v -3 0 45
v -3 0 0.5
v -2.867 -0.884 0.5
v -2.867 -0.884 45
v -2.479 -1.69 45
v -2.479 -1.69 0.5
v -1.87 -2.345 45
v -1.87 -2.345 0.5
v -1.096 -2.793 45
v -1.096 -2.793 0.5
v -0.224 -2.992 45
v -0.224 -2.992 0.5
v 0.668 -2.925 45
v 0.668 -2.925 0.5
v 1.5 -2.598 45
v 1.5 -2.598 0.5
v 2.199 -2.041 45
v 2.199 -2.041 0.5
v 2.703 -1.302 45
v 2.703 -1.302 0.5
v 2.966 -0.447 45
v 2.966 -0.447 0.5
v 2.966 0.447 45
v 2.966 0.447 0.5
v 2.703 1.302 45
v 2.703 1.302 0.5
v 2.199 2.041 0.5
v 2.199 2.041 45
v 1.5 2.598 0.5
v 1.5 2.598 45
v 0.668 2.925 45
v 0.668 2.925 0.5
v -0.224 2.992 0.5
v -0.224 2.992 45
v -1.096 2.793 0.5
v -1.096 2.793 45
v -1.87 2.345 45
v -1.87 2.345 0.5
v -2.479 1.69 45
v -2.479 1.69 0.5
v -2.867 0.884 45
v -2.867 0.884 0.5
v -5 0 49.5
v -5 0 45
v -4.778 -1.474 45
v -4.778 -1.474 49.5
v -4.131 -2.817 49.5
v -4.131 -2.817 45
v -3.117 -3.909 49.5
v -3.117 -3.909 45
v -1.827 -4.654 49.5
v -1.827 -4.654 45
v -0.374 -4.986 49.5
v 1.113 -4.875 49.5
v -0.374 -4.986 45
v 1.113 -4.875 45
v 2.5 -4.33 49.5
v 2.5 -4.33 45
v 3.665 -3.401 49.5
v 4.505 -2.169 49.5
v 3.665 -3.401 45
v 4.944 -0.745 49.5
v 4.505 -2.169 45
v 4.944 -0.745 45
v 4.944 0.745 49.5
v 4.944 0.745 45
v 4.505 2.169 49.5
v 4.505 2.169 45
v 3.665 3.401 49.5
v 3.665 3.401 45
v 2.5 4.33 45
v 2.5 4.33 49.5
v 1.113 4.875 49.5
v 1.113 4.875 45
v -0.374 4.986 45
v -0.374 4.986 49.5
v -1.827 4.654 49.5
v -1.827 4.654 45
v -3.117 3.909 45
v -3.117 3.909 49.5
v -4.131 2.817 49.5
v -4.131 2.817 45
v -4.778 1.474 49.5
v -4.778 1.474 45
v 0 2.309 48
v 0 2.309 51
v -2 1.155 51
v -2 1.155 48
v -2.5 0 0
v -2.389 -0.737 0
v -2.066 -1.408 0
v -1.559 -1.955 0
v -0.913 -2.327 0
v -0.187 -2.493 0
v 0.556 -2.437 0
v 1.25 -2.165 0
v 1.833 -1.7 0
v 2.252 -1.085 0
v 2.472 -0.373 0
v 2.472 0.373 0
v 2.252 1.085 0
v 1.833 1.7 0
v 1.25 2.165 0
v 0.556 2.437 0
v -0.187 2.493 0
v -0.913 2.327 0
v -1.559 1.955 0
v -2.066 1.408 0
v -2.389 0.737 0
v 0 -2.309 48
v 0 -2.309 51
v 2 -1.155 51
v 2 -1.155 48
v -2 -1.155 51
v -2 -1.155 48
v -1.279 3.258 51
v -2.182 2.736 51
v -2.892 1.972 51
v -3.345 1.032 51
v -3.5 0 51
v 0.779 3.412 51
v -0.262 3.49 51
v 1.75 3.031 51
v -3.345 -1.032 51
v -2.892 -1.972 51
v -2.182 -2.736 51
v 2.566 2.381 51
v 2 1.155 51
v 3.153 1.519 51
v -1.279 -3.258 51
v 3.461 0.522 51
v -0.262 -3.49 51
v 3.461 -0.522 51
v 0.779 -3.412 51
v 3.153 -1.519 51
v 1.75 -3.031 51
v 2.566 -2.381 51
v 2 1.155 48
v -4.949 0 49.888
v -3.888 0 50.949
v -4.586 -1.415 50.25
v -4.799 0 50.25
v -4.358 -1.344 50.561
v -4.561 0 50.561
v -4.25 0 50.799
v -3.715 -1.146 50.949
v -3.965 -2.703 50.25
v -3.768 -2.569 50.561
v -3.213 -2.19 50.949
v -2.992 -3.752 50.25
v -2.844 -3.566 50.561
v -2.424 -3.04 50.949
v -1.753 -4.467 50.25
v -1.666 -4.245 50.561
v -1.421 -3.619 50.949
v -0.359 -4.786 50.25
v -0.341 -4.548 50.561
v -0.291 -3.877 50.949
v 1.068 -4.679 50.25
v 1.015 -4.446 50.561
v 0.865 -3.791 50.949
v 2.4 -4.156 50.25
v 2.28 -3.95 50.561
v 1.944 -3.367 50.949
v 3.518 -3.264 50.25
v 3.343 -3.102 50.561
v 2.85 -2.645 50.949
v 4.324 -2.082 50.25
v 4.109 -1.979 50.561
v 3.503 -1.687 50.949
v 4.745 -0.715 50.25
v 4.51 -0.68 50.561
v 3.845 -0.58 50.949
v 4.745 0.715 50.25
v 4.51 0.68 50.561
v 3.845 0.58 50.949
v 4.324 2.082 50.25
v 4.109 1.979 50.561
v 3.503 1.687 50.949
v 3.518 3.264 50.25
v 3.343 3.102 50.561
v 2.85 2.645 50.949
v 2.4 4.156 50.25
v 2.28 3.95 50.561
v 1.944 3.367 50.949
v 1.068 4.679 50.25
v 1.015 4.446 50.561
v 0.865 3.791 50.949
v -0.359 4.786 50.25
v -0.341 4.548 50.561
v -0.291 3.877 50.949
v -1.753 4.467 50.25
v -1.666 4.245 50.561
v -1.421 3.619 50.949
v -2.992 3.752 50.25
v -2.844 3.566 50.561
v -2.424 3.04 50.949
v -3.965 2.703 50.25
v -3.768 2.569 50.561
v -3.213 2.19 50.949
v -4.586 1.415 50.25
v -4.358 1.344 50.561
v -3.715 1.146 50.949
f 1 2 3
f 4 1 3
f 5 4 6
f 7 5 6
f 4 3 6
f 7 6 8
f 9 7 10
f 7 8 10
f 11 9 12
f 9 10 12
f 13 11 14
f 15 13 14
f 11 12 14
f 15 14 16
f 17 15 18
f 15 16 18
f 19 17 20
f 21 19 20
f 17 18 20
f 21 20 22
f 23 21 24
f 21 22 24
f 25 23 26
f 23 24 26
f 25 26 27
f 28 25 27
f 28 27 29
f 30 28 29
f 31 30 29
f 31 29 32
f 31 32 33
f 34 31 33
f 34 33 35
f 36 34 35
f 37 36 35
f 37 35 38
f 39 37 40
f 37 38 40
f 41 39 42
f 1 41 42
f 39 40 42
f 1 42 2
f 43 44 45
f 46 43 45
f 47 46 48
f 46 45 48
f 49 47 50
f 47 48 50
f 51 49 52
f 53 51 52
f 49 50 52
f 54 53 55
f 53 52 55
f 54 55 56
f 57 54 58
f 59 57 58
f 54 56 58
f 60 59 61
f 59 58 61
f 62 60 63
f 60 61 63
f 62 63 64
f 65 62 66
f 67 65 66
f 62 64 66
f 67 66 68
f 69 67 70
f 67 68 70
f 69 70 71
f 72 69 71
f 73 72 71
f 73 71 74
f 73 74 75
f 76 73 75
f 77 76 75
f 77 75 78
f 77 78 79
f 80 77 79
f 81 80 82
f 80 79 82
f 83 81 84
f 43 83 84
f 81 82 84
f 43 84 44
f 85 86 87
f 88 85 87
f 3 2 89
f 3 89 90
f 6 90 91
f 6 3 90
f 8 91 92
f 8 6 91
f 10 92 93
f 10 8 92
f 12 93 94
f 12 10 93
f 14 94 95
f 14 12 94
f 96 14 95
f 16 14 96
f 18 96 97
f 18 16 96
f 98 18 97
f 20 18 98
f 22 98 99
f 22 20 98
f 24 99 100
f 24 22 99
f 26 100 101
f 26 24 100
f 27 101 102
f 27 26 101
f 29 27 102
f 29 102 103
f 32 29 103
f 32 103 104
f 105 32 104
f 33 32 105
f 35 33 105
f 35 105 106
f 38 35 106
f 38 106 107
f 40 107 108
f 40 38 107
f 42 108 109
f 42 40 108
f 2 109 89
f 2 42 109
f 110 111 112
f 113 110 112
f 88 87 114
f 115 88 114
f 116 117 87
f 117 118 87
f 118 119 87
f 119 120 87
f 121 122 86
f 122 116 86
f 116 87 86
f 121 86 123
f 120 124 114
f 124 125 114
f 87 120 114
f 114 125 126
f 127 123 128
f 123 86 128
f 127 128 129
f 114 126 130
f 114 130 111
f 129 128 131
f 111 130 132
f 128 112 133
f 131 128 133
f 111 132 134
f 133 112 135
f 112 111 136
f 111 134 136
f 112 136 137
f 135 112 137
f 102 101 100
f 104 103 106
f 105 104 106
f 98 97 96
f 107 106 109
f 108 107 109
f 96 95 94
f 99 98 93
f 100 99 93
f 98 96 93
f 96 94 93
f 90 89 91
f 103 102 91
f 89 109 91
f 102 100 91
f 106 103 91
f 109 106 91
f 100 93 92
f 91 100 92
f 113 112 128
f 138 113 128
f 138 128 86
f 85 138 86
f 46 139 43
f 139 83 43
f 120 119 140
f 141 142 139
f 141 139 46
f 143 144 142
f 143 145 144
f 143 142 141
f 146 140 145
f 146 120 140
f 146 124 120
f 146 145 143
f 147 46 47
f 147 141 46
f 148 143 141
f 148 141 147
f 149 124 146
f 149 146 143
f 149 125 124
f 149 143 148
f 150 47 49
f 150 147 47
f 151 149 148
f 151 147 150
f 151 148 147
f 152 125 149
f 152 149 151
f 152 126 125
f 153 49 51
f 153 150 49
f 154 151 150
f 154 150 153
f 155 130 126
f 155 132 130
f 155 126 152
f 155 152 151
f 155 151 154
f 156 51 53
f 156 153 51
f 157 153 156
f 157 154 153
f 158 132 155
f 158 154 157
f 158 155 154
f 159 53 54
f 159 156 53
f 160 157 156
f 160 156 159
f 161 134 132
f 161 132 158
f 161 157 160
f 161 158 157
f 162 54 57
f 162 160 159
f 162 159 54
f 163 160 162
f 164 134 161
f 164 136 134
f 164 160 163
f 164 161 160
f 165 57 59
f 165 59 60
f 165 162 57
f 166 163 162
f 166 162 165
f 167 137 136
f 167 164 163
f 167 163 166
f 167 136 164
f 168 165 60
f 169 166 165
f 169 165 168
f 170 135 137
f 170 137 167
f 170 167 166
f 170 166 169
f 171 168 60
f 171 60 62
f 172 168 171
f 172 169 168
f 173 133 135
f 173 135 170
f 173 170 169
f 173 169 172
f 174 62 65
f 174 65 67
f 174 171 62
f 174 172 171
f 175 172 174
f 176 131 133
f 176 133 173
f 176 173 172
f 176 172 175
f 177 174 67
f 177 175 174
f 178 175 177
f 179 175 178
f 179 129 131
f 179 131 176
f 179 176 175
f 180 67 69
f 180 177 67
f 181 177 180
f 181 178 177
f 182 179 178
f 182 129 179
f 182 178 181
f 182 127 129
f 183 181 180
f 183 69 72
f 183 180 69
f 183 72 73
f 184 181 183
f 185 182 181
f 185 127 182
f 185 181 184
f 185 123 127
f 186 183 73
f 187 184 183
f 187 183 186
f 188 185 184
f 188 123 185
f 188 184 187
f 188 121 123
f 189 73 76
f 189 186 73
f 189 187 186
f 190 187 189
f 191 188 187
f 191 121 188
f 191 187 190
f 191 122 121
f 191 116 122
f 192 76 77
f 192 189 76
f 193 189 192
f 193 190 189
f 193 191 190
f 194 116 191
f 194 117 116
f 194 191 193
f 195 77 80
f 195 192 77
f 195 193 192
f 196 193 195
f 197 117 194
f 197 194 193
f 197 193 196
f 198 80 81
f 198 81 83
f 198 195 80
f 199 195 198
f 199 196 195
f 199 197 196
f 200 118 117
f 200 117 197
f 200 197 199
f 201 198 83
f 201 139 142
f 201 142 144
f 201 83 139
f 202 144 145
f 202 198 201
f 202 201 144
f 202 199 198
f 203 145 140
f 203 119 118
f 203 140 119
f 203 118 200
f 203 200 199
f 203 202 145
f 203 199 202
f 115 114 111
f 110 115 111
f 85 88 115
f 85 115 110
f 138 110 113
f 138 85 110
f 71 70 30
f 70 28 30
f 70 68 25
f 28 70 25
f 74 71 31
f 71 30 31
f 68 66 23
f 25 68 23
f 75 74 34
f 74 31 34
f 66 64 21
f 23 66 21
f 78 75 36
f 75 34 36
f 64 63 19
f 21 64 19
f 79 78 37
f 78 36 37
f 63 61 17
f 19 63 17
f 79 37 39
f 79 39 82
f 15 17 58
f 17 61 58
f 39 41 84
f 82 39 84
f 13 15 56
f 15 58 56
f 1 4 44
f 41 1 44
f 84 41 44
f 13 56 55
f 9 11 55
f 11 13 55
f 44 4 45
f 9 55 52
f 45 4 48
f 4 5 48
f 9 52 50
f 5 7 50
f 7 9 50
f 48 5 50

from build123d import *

# Parameters (mm, degrees)
F2_SIZE  = 0.5
F3_R     = 1.5
F5_DEPTH = 3


with BuildPart() as f1:
    # F0 (on Front) → F1 (revolve)
    with BuildSketch(Plane.XZ):
        Polygon((-3, 0), (0, 0), (0, 51), (-5, 51), (-5, 45), (-3, 45), align=None)
    revolve(axis=Axis((0, 0, 29.048277), (0, 0, 1)))

    # F2
    f2_edges = [f1.edges().sort_by_distance(p)[0] for p in [
        (3, 0, 0),
    ]]
    chamfer(f2_edges, length=F2_SIZE)

    # F3
    f3_edges = [f1.edges().sort_by_distance(p)[0] for p in [
        (5, 0, 51),
    ]]
    fillet(f3_edges, radius=F3_R)

    # F4 (on face) → F5 (cut)
    with BuildSketch(Plane.XY.offset(51)):
        Polygon((-2, 1.154701), (-2, -1.154701), (0, -2.309401), (2, -1.154701), (2, 1.154701), (0, 2.309401), align=None)
    extrude(amount=-F5_DEPTH, mode=Mode.SUBTRACT)


solid = f1.part
